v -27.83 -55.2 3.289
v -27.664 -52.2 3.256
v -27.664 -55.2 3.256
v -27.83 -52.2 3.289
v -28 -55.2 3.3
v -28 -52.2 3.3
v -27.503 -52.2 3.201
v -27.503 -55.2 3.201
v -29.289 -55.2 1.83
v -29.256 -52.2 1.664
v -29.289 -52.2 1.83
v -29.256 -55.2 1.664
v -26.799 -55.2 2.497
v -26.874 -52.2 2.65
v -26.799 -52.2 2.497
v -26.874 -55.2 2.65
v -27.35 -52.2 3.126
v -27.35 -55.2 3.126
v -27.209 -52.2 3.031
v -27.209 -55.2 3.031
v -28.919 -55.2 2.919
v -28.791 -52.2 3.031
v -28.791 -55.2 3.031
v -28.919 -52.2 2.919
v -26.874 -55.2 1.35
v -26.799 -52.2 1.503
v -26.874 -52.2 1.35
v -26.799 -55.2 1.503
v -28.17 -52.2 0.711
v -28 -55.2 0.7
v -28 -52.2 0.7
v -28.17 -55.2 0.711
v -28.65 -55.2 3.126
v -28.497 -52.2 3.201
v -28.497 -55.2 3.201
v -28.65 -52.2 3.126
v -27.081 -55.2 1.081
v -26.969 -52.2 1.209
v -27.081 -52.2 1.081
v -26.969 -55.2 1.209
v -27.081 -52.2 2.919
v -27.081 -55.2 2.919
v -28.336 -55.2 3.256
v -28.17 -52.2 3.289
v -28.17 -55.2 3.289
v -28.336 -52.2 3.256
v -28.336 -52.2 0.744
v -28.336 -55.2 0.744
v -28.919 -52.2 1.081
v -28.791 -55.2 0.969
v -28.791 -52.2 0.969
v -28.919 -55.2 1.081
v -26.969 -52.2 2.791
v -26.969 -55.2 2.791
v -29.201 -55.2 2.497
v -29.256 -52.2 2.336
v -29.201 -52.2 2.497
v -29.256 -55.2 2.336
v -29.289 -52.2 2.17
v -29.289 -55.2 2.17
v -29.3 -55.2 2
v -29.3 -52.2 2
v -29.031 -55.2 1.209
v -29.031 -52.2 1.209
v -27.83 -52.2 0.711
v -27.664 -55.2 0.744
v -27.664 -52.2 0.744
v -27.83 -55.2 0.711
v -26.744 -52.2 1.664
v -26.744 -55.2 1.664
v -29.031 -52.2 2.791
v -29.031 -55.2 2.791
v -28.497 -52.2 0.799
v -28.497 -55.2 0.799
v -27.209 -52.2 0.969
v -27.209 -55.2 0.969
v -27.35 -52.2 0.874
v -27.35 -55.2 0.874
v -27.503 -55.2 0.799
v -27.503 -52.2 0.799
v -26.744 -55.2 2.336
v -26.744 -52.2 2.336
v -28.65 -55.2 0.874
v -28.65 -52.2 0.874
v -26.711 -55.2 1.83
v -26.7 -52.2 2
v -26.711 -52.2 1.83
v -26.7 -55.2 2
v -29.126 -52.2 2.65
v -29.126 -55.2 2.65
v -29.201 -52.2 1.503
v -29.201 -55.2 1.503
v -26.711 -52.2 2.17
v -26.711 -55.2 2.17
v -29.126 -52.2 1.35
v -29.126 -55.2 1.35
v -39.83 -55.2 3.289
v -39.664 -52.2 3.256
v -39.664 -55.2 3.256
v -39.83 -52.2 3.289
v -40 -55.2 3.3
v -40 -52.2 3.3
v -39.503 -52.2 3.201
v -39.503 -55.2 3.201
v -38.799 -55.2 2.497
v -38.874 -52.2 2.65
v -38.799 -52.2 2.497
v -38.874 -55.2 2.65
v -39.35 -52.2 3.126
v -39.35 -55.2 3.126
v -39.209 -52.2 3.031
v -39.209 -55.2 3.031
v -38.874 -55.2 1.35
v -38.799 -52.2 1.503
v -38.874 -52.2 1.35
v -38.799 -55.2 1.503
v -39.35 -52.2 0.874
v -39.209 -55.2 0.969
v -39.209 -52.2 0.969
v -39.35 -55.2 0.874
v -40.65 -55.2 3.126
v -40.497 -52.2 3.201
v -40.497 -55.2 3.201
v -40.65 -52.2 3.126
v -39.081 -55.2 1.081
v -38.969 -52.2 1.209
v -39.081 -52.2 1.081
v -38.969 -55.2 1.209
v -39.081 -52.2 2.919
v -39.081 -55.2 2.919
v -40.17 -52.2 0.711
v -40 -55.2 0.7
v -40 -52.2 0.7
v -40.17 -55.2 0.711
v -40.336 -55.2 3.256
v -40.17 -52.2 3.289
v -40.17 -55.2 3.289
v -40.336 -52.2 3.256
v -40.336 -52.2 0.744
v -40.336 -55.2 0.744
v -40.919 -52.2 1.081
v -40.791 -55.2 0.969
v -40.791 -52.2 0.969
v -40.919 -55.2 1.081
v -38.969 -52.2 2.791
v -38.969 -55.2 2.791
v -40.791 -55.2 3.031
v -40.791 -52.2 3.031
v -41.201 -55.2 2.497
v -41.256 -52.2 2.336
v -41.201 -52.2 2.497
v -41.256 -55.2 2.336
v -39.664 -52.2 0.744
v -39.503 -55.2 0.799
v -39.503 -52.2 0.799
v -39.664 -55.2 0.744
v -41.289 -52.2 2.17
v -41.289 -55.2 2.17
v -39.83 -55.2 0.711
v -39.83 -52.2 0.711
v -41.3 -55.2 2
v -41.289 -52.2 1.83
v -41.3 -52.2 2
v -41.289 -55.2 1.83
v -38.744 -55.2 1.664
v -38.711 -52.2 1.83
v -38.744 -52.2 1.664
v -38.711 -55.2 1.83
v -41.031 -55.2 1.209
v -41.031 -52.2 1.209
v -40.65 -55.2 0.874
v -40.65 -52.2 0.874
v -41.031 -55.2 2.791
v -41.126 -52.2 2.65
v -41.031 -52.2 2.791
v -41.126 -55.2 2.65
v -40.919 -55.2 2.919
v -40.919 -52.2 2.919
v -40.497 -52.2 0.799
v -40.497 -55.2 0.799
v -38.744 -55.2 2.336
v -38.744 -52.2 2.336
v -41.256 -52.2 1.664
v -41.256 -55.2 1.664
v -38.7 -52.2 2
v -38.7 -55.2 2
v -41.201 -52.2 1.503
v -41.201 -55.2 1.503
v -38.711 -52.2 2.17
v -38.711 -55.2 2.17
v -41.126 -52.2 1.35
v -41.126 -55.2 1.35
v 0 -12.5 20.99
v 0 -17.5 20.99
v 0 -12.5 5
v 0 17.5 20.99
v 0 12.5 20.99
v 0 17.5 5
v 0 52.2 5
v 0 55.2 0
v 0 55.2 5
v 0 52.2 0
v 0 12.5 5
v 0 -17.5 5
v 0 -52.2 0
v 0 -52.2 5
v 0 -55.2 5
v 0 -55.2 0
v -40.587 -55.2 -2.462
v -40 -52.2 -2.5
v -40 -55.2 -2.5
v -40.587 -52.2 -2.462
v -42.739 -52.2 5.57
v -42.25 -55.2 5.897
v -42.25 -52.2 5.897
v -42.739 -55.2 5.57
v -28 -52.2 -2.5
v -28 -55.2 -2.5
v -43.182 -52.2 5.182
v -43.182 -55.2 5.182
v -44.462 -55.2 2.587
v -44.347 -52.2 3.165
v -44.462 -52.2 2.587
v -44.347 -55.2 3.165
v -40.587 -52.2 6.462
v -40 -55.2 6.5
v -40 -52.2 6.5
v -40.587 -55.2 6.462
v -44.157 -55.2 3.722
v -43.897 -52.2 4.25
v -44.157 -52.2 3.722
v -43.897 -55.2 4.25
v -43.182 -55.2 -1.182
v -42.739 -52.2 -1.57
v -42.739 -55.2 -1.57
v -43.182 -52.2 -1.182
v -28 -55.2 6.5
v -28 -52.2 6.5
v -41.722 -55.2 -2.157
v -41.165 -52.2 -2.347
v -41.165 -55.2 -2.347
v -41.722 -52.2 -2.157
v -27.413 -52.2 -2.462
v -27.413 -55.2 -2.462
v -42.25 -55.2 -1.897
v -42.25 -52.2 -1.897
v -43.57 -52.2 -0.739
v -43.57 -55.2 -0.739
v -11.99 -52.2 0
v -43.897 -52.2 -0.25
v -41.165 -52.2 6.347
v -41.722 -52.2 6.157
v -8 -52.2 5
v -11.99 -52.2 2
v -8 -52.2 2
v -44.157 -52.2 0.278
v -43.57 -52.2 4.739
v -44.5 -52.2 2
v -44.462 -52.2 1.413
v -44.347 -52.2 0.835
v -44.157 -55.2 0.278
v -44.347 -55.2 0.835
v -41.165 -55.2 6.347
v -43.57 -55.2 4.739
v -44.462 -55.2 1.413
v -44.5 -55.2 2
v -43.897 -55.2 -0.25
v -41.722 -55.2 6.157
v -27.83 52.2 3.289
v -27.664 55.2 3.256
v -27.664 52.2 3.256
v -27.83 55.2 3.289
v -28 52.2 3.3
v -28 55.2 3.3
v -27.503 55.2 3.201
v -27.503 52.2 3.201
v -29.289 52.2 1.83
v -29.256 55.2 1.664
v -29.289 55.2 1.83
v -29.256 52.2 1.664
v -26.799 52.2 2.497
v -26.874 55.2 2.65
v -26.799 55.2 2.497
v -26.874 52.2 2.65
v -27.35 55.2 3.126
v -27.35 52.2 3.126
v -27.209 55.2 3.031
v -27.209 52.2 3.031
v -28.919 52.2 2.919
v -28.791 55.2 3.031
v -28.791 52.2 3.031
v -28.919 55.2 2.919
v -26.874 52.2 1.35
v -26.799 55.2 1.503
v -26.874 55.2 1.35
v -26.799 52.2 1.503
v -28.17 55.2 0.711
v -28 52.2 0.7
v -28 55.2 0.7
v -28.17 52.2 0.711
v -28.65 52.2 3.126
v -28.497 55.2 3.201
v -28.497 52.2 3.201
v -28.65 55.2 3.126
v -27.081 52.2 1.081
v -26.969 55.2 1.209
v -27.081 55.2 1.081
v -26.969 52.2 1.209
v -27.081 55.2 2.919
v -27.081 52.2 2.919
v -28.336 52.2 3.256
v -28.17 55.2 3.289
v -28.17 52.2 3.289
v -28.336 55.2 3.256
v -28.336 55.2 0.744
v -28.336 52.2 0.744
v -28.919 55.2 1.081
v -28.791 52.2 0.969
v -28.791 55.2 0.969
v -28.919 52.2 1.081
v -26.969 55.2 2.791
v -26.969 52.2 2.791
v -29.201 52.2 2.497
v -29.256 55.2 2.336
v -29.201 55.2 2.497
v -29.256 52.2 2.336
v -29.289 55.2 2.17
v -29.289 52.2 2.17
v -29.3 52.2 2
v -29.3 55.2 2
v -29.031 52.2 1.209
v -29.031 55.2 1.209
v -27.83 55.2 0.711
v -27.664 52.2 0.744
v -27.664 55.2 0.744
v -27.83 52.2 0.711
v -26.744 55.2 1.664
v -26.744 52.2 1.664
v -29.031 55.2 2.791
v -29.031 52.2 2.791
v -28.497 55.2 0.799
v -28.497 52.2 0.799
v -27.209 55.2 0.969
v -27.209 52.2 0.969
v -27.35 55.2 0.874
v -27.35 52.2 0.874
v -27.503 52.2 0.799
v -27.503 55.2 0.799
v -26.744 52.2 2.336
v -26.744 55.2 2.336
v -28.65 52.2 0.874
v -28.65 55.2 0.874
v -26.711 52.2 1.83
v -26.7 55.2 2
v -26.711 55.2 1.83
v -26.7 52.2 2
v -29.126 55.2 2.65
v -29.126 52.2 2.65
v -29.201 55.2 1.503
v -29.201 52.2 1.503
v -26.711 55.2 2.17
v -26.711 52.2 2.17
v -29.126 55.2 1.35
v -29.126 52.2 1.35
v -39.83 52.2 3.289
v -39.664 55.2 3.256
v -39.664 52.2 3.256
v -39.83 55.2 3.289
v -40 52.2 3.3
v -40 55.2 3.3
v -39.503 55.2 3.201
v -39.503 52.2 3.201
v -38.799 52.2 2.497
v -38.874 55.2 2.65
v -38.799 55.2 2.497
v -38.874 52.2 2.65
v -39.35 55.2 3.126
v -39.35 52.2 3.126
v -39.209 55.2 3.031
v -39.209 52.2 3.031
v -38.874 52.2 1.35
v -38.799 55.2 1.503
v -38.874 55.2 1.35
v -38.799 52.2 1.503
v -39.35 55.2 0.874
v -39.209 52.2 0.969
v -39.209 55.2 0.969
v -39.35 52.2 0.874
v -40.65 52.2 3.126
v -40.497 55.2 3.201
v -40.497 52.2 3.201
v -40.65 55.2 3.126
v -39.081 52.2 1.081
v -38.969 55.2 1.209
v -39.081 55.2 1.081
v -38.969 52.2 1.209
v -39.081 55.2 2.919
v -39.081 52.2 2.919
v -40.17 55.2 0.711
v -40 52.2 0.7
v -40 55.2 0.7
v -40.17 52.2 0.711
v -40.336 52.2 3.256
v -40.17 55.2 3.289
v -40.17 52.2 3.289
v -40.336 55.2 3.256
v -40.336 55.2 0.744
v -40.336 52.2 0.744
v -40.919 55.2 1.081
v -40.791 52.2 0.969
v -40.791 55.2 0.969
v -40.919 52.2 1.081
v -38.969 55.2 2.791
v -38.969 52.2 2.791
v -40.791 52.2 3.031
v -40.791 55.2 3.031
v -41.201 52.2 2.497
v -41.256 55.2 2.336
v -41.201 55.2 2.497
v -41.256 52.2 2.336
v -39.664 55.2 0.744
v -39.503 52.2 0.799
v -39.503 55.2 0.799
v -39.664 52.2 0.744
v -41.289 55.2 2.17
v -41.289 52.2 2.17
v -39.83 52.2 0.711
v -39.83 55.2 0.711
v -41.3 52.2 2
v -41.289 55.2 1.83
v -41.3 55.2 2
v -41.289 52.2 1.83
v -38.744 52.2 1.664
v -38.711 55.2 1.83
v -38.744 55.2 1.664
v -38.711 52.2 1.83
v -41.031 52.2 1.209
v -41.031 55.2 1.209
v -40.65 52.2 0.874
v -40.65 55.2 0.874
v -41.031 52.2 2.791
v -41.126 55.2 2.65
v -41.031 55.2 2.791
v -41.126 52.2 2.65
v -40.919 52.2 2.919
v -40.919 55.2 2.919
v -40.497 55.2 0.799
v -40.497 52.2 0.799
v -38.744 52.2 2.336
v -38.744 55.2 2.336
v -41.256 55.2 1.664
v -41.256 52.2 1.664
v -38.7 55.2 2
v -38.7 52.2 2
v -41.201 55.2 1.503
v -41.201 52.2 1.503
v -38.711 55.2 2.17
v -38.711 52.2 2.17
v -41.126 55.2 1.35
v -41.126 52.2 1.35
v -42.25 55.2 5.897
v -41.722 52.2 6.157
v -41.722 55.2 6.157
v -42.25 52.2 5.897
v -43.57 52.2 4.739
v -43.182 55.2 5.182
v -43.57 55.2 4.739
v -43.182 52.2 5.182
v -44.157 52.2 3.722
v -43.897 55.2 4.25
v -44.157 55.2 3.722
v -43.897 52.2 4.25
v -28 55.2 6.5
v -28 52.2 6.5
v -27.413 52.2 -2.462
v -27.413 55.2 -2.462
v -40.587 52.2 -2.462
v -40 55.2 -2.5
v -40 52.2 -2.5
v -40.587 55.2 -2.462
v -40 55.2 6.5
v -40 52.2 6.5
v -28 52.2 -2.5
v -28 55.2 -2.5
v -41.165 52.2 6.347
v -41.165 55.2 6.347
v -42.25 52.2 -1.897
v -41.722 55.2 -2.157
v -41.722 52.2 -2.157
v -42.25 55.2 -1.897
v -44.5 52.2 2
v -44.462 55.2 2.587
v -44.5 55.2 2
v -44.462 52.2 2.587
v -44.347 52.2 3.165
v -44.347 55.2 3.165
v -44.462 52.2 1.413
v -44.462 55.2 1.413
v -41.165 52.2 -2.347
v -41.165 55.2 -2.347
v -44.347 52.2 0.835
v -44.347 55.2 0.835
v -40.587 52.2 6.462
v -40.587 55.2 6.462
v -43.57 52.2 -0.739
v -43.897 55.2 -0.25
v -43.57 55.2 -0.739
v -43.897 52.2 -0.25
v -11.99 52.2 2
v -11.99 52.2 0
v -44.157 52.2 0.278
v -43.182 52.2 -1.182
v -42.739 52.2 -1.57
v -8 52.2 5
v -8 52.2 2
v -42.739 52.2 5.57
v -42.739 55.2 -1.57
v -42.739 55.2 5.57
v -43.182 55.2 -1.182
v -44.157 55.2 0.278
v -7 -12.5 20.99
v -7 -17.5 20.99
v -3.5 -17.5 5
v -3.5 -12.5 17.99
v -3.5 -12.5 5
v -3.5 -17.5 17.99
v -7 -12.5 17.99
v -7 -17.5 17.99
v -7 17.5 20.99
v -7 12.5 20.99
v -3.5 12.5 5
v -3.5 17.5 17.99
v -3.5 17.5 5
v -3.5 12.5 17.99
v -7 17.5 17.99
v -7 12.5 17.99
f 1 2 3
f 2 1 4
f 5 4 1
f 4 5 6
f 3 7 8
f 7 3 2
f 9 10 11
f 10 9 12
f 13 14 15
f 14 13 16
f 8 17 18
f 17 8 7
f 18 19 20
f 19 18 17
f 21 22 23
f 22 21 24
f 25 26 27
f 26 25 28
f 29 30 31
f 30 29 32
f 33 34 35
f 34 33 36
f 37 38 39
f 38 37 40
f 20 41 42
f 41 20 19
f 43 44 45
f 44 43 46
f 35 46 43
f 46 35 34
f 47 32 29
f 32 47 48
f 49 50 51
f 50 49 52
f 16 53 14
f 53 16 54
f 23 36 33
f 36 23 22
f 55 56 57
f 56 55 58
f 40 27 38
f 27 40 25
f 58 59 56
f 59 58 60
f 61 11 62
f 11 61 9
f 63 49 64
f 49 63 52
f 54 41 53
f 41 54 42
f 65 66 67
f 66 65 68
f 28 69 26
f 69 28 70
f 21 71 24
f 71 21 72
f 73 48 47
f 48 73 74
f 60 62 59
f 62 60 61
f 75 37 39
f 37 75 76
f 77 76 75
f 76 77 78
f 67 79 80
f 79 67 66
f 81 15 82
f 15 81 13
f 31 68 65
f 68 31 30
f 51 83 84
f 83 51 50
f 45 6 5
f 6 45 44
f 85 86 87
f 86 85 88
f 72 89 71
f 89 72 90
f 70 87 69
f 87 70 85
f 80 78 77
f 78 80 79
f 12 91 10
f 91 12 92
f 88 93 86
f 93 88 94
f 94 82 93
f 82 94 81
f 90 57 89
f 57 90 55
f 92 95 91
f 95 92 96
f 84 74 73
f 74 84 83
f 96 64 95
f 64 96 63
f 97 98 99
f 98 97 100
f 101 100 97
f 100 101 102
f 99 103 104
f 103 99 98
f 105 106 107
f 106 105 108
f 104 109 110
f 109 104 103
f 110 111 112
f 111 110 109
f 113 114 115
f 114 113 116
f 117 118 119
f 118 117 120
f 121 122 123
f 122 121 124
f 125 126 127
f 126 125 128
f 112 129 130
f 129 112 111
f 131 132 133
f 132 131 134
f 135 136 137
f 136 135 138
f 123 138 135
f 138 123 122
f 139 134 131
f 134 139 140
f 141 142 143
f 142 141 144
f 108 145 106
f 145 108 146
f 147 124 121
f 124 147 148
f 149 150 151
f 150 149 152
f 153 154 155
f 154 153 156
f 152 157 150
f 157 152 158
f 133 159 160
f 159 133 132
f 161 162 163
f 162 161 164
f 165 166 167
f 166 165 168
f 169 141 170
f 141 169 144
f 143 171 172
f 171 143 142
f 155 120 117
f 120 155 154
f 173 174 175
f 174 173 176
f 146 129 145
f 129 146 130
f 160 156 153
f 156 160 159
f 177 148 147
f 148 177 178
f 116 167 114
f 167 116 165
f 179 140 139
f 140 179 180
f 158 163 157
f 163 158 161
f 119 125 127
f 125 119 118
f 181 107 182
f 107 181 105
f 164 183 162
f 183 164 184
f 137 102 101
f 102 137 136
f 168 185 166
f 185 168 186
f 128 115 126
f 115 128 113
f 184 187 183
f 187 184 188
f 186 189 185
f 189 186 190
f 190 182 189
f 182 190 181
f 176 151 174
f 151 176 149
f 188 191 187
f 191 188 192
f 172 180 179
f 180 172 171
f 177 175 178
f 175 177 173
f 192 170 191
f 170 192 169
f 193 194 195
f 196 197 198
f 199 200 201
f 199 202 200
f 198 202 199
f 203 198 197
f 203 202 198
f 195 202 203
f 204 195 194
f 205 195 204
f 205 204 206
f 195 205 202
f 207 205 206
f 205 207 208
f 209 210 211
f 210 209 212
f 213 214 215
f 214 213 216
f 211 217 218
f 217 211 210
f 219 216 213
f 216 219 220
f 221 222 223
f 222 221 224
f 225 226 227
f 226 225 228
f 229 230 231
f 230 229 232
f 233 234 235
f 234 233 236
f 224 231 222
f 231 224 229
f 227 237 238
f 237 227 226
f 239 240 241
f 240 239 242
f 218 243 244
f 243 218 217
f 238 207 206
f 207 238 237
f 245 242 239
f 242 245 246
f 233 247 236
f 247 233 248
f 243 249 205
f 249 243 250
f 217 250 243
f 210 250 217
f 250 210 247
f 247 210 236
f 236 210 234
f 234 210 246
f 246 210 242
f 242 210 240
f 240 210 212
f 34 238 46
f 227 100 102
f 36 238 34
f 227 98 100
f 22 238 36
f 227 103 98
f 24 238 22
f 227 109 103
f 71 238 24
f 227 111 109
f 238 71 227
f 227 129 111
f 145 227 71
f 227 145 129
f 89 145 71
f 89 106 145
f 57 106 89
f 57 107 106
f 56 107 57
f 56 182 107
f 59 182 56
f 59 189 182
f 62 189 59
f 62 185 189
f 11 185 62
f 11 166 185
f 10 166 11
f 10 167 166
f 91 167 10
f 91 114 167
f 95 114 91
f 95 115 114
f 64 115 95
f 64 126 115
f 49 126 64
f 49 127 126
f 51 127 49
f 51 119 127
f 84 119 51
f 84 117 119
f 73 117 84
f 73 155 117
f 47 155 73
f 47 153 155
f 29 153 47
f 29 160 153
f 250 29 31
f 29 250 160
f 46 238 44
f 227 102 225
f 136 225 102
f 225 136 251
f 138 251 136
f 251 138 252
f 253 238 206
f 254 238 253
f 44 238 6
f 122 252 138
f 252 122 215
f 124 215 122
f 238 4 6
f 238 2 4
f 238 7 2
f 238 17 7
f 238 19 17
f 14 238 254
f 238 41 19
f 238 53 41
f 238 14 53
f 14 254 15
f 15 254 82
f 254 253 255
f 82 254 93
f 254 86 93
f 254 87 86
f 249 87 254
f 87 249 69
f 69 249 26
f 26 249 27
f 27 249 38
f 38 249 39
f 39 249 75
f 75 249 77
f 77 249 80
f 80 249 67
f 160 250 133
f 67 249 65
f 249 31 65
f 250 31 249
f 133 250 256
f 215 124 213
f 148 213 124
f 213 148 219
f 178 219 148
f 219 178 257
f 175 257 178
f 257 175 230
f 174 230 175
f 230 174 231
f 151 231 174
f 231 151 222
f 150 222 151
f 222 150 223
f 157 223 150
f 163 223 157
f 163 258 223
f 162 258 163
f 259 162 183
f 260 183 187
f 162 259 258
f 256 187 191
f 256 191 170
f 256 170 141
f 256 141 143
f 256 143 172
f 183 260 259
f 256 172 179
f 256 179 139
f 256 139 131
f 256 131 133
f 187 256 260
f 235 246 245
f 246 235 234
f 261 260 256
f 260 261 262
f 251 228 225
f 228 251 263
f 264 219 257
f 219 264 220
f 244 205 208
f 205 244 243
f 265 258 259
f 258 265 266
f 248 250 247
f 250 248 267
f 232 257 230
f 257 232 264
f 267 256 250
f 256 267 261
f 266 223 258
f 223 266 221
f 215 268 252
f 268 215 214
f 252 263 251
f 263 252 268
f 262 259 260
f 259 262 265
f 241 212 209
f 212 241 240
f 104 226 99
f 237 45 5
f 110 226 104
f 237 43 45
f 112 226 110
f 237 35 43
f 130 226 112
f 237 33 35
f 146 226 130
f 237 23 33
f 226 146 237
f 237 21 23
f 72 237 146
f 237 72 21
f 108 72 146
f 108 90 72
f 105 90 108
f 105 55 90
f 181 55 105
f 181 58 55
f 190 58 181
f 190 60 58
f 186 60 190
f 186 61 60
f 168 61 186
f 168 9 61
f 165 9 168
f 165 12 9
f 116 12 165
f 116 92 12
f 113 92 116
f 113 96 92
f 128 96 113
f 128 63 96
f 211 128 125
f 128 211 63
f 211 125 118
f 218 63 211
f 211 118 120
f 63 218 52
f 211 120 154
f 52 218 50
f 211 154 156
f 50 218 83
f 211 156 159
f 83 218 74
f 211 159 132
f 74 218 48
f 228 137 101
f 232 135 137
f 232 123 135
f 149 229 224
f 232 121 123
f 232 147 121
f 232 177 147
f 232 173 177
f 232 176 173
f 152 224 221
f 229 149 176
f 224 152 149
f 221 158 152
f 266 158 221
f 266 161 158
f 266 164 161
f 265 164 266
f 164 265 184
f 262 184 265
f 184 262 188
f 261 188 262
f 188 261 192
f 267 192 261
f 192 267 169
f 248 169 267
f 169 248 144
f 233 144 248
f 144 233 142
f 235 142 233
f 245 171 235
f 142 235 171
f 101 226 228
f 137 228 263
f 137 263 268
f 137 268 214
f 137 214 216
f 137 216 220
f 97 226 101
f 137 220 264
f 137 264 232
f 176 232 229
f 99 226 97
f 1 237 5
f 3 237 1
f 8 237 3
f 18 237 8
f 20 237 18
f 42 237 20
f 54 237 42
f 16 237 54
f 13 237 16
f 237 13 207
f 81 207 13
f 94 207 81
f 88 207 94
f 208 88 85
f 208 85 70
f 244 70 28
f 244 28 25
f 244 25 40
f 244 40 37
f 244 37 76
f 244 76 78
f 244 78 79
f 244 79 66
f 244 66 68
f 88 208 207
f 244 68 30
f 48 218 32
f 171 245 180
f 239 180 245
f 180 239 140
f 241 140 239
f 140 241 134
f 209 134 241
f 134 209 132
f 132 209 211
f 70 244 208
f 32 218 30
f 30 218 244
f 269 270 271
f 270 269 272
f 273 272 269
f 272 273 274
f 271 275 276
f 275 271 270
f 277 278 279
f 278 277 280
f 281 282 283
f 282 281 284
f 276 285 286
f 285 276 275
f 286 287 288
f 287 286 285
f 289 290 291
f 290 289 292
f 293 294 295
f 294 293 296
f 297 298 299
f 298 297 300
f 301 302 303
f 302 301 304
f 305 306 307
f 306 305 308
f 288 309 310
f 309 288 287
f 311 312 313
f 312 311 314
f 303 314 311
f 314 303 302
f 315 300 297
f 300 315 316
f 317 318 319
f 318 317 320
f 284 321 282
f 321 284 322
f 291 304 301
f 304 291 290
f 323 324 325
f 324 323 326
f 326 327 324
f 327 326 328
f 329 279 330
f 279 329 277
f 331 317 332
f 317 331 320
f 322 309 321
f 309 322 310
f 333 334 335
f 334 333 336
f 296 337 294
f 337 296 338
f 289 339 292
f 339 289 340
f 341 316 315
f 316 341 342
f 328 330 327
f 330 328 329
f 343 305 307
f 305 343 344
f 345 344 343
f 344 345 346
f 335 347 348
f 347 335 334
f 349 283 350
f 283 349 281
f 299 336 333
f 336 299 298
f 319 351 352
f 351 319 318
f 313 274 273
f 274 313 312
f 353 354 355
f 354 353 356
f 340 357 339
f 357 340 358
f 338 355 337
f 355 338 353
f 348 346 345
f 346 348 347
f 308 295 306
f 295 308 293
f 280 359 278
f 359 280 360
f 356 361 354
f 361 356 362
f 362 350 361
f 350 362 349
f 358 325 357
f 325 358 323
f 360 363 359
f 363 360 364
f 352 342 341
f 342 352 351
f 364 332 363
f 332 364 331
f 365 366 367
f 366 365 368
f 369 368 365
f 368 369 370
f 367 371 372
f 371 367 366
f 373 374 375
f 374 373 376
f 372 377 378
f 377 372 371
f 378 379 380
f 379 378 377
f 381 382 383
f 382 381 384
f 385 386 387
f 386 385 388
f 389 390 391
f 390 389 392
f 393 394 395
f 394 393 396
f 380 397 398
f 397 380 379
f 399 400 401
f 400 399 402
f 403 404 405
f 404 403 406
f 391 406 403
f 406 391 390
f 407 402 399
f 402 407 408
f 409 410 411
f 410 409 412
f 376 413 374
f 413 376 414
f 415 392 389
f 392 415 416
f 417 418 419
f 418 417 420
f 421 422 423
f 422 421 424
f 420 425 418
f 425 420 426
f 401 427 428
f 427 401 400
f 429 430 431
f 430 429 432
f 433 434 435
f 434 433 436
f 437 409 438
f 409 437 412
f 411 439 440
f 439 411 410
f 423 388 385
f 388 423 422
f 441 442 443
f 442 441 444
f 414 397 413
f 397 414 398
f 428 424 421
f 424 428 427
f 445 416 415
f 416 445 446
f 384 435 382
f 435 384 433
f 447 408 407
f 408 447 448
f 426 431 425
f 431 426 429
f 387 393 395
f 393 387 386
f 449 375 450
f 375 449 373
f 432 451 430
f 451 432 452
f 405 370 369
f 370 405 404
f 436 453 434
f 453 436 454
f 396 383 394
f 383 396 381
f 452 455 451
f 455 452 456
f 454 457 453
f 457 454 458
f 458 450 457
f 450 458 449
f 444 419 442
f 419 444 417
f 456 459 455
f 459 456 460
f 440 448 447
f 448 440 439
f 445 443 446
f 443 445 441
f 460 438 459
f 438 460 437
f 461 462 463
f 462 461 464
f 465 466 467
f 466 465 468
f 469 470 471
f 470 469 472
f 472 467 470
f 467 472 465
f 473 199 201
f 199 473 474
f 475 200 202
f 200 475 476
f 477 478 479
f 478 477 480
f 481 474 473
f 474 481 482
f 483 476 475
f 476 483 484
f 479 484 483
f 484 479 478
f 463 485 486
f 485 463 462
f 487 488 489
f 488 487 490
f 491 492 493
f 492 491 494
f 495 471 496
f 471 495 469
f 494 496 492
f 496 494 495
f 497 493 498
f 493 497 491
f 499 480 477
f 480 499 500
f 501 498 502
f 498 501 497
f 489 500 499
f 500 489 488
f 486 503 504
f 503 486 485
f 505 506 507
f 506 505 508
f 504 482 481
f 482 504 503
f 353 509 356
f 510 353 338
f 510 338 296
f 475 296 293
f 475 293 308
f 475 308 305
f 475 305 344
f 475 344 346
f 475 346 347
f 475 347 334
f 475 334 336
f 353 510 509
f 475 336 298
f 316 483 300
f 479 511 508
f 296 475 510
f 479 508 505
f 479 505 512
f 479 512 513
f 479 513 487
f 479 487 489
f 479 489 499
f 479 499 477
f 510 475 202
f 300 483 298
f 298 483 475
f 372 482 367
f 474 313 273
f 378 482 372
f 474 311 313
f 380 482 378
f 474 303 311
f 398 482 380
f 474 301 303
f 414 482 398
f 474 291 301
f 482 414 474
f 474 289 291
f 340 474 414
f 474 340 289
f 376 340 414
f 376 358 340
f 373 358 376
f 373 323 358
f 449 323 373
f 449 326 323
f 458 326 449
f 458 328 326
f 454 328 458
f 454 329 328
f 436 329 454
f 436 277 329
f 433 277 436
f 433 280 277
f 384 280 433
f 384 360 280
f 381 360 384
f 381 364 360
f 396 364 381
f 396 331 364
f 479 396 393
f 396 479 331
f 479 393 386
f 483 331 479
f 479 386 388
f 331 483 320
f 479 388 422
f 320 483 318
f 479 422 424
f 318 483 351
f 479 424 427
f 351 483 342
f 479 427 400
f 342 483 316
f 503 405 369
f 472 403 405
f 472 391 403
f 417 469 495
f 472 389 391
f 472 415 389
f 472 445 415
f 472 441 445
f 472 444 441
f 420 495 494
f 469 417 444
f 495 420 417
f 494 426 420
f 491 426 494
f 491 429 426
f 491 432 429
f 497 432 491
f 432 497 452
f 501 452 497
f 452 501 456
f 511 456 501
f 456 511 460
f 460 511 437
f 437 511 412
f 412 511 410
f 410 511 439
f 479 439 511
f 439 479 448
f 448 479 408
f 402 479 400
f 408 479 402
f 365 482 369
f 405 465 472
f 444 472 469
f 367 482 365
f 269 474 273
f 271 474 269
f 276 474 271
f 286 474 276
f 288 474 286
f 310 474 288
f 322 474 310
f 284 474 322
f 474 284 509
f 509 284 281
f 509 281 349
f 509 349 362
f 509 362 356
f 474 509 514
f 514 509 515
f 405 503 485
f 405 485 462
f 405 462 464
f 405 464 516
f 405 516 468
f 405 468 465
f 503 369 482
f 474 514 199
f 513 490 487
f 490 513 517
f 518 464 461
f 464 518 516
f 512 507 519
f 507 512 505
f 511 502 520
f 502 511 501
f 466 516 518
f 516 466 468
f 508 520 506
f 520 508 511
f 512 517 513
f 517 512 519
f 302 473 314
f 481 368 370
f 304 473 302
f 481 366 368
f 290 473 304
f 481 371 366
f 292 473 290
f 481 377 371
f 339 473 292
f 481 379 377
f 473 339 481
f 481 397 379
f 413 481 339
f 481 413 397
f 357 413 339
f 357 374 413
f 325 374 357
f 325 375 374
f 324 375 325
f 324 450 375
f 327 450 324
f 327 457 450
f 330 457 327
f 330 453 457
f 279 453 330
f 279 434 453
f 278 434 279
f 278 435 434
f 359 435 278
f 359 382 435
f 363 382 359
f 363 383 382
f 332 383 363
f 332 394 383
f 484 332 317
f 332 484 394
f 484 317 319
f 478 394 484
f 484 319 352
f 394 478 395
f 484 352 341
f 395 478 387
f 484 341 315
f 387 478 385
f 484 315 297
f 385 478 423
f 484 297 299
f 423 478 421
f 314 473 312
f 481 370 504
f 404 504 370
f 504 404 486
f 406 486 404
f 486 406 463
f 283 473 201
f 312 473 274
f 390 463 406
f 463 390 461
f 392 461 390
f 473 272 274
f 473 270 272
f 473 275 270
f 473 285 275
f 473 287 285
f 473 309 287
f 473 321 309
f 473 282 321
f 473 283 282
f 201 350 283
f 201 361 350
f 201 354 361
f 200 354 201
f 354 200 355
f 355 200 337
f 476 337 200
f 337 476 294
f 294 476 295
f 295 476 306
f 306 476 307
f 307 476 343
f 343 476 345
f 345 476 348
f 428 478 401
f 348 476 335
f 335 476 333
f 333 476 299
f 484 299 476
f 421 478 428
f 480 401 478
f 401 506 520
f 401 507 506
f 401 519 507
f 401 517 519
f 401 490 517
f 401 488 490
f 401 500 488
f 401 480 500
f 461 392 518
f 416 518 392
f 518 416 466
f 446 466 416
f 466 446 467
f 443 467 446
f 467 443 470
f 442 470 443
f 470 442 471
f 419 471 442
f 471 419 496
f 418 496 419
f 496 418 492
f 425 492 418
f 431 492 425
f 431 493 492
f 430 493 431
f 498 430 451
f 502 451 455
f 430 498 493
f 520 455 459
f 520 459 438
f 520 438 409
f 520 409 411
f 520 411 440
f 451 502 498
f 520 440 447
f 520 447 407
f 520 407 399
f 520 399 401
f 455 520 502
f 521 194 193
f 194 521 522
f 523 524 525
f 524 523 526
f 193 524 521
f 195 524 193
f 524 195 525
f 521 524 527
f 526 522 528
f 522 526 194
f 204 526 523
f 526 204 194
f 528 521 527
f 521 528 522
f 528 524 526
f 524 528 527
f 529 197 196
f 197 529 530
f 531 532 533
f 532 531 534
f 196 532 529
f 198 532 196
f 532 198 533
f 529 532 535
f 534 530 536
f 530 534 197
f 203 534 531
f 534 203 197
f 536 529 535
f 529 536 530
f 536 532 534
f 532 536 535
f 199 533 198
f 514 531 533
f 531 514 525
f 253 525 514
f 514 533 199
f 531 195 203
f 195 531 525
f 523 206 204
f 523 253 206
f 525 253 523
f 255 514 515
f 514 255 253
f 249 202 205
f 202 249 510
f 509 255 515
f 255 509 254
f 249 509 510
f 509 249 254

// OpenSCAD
// file: params.scad
// ===========================================================================
//  Cozmo replica - shared dimensions for every printed part
//  Units: mm.  Robot frame: x = forward, y = left, z = up, origin = ground
//  centre.  Change values here, then re-export with hardware/3d/export.sh.
// ===========================================================================

$fn = 48;
eps = 0.01;
clr = 0.25;            // general printing clearance

// ---------------------------------------------------------------- fasteners
m3_hole      = 3.3;    // clearance hole
m3_tap       = 2.6;    // self-tapping into plastic
m3_nut_af    = 5.7;    // nut across flats (+clearance)
m3_nut_h     = 2.6;
m2_tap       = 1.8;
pin_hole     = 1.95;   // 1.75 mm filament used as track pins

// ---------------------------------------------------------------- tracks
pitch        = 8;      // track link pitch
teeth        = 12;     // sprocket teeth = links wrapped per revolution
link_t       = 3.6;    // link thickness (= hinge barrel diameter)
link_w       = 16;     // link width
grouser_h    = 1.2;    // tread ridge height
r_pin        = (pitch / 2) / sin(180 / teeth);    // pin circle radius (15.45)
axle_z       = r_pin + link_t / 2 + grouser_h;    // axle height (18.45)
wheelbase    = 56;     // with 26 links per side: 2*56 + 12*8 = 208 = 26*8
links_per_side = 26;
axle_x_rear  = -wheelbase / 2;   // drive sprocket (motor)
axle_x_front =  wheelbase / 2;   // idler

// ---------------------------------------------------------------- chassis tub
wall         = 2;
tub_len      = 86;
tub_w        = 70;
tub_z0       = 8;      // ground clearance
tub_h        = 42;     // tub top at z = 50
tub_r        = 6;      // vertical corner radius
floor_t      = 2;
tub_top      = tub_z0 + tub_h;
track_y      = tub_w / 2 + 1 + link_w / 2;        // 44: track centre line

// ---------------------------------------------------------------- N20 motor
n20_w        = 12.2;   // gearbox width (z when mounted)
n20_h        = 10.2;   // gearbox height
n20_len      = 33;     // gearbox + motor + encoder
n20_shaft_d  = 3;
n20_shaft_flat = 2.5;  // D-shaft flat
n20_shaft_len = 10;

// ---------------------------------------------------------------- servos (SG90 / MG90S)
servo_l      = 23.0;   // body length
servo_w      = 12.6;   // body width
servo_h      = 22.8;   // body height (to tab underside ~15.9)
servo_tab_l  = 32.6;   // length over mounting tabs
servo_tab_t  = 2.6;
servo_tab_z  = 15.9;   // tab underside from body bottom
servo_shaft_off = 5.9; // output shaft centre from body end
servo_shaft_h = 28.5;  // body bottom to top of spline

// ---------------------------------------------------------------- OLED
// Default: 1.3" I2C module (SH1106). For a 0.96" module set oled_096 = true
// (and OLED_IS_SH1106 = false in firmware/include/config.h).
oled_096     = false;
oled_pcb     = oled_096 ? [27.4, 27.8] : [35.6, 33.8];  // w x h
oled_view    = oled_096 ? [23.0, 12.0] : [30.0, 15.4];  // visible window
oled_view_dz = oled_096 ? 3.6 : 2.6;   // window centre above PCB centre
oled_pcb_t   = 1.7;
oled_glass_t = 1.6;
oled_hole_d  = 2.2;
oled_hole_in = oled_096 ? 2.0 : 2.3;   // hole centre from PCB edges

// ---------------------------------------------------------------- head
head_w       = 56;     // y
head_d       = 36;     // x
head_h       = 44;     // z
head_r       = 7;
head_wall    = 1.8;
head_pivot   = [6, 0, 72];     // pivot axis position in robot frame
head_below   = 12;     // head bottom is this far below the pivot
cheek_t      = 3;

// ---------------------------------------------------------------- lift (parallel 4-bar)
lift_pivot_x = -25;
lift_pivot_lo_z = 59;
lift_pivot_hi_z = 71;
lift_link_len = 80;
lift_link_y  = 57.5;   // link centre plane (outside the tracks + servo horn)
lift_link_t  = 4;
lift_link_h  = 7;
carrier_drop = 28;     // carrier extends this far below the lower pin
fork_y       = 15;     // forks at +-fork_y
fork_len     = 16;

// ---------------------------------------------------------------- misc parts
battery      = [52, 36, 11];   // 1S LiPo 103450 bay (l, w, h)
speaker_d    = 28.5;           // 28 mm 8 ohm speaker
speaker_t    = 5;
switch_slot  = [8.8, 4.2];     // SS12D00 slide switch
usbc_slot    = [9.6, 3.8];     // TP4056 USB-C charging port
led_count    = 4;
led_pitch    = 7;              // WS2812 spacing on the backpack bar

// ---------------------------------------------------------------- helpers
module rounded_box(size, r, center = false) {
  // Box with rounded vertical edges.
  translate(center ? [-size[0] / 2, -size[1] / 2, -size[2] / 2] : [0, 0, 0])
    hull() for (x = [r, size[0] - r], y = [r, size[1] - r])
      translate([x, y, 0]) cylinder(r = r, h = size[2]);
}

module rounded_cube(size, r) {
  // Box with every edge rounded (centred).
  hull() for (x = [-1, 1], y = [-1, 1], z = [-1, 1])
    translate([x * (size[0] / 2 - r), y * (size[1] / 2 - r), z * (size[2] / 2 - r)])
      sphere(r = r, $fn = 24);
}

module hex_nut_pocket(h = m3_nut_h) {
  cylinder(d = m3_nut_af / cos(30), h = h, $fn = 6);
}
// main file
// ===========================================================================
//  Lift mechanism (parallel 4-bar like the original toy's forklift):
//    part = "link"       plain link, print 3
//    part = "link_servo" lower right link, screws onto a single-arm servo horn
//    part = "fork"       both carriers + crossbar + forks in one piece
//  Links: print flat. Fork: print standing on its back face (x = -2 side).
// ===========================================================================
include <params.scad>

part = "fork";

L = lift_link_len;
pin_dz = lift_pivot_hi_z - lift_pivot_lo_z;  // 12

module link_body() {
  hull() for (x = [0, L]) translate([x, 0, 0]) cylinder(d = lift_link_h + 2, h = lift_link_t);
}

module link() {
  difference() {
    link_body();
    for (x = [0, L]) translate([x, 0, -1]) cylinder(d = m3_hole, h = lift_link_t + 2);
    // lightening slot
    hull() for (x = [14, L - 14]) translate([x, 0, -1]) cylinder(d = 3, h = lift_link_t + 2);
  }
}

module link_servo() {
  difference() {
    union() {
      link_body();
      translate([0, 0, 0]) cylinder(d = 14, h = lift_link_t);
    }
    // Horn screw / hub
    translate([0, 0, -1]) cylinder(d = 2.6, h = lift_link_t + 2);
    translate([0, 0, lift_link_t - 1.6]) cylinder(d = 7.6, h = 2);  // horn hub recess
    // Single-arm horn holes (SG90/MG90S arm: 3.5 mm pitch from 10 mm)
    for (x = [10.5, 14, 17.5]) translate([x, 0, -1]) cylinder(d = 1.5, h = lift_link_t + 2, $fn = 12);
    // Horn arm recess (glue + screws)
    translate([0, -3.2, lift_link_t - 1.6]) cube([20, 6.4, 2]);
    translate([L, 0, -1]) cylinder(d = m3_hole, h = lift_link_t + 2);
    hull() for (x = [24, L - 14]) translate([x, 0, -1]) cylinder(d = 3, h = lift_link_t + 2);
  }
}

// Fork assembly, frame: origin on the lower carrier pin, x forward.
carrier_y = [lift_link_y - lift_link_t / 2 - 3.3, lift_link_y - lift_link_t / 2 - 0.3];  // just inside the links
bar_z = [-carrier_drop, -carrier_drop + 8];

module carrier(s) {
  y0 = s > 0 ? carrier_y[0] : -carrier_y[1];
  difference() {
    hull() {
      translate([-2, y0, bar_z[0]]) cube([5, carrier_y[1] - carrier_y[0], 1]);
      for (z = [0, pin_dz]) translate([0, y0, z]) rotate([-90, 0, 0]) cylinder(d = 9, h = carrier_y[1] - carrier_y[0]);
    }
    for (z = [0, pin_dz]) translate([0, y0 - 1, z]) rotate([-90, 0, 0]) cylinder(d = m3_tap, h = 10);
  }
}

module fork() {
  for (s = [-1, 1]) carrier(s);
  // Crossbar
  translate([-2, -carrier_y[1], bar_z[0]]) cube([5, 2 * carrier_y[1], bar_z[1] - bar_z[0]]);
  // Forks with lifting hooks
  for (s = [-1, 1]) translate([3 - eps, s * fork_y - 2.5, bar_z[0]]) {
    cube([fork_len, 5, 3.5]);
    translate([fork_len - 3, 0, 0]) cube([3, 5, 7]);
  }
  // Stiffening rib on the crossbar top
  translate([-2, -carrier_y[0], bar_z[1] - eps]) cube([2, 2 * carrier_y[0], 4]);
}

if (part == "link") link();
else if (part == "link_servo") link_servo();
else rotate([0, -90, 0]) translate([2, 0, carrier_drop]) fork();  // print orientation: back face down
